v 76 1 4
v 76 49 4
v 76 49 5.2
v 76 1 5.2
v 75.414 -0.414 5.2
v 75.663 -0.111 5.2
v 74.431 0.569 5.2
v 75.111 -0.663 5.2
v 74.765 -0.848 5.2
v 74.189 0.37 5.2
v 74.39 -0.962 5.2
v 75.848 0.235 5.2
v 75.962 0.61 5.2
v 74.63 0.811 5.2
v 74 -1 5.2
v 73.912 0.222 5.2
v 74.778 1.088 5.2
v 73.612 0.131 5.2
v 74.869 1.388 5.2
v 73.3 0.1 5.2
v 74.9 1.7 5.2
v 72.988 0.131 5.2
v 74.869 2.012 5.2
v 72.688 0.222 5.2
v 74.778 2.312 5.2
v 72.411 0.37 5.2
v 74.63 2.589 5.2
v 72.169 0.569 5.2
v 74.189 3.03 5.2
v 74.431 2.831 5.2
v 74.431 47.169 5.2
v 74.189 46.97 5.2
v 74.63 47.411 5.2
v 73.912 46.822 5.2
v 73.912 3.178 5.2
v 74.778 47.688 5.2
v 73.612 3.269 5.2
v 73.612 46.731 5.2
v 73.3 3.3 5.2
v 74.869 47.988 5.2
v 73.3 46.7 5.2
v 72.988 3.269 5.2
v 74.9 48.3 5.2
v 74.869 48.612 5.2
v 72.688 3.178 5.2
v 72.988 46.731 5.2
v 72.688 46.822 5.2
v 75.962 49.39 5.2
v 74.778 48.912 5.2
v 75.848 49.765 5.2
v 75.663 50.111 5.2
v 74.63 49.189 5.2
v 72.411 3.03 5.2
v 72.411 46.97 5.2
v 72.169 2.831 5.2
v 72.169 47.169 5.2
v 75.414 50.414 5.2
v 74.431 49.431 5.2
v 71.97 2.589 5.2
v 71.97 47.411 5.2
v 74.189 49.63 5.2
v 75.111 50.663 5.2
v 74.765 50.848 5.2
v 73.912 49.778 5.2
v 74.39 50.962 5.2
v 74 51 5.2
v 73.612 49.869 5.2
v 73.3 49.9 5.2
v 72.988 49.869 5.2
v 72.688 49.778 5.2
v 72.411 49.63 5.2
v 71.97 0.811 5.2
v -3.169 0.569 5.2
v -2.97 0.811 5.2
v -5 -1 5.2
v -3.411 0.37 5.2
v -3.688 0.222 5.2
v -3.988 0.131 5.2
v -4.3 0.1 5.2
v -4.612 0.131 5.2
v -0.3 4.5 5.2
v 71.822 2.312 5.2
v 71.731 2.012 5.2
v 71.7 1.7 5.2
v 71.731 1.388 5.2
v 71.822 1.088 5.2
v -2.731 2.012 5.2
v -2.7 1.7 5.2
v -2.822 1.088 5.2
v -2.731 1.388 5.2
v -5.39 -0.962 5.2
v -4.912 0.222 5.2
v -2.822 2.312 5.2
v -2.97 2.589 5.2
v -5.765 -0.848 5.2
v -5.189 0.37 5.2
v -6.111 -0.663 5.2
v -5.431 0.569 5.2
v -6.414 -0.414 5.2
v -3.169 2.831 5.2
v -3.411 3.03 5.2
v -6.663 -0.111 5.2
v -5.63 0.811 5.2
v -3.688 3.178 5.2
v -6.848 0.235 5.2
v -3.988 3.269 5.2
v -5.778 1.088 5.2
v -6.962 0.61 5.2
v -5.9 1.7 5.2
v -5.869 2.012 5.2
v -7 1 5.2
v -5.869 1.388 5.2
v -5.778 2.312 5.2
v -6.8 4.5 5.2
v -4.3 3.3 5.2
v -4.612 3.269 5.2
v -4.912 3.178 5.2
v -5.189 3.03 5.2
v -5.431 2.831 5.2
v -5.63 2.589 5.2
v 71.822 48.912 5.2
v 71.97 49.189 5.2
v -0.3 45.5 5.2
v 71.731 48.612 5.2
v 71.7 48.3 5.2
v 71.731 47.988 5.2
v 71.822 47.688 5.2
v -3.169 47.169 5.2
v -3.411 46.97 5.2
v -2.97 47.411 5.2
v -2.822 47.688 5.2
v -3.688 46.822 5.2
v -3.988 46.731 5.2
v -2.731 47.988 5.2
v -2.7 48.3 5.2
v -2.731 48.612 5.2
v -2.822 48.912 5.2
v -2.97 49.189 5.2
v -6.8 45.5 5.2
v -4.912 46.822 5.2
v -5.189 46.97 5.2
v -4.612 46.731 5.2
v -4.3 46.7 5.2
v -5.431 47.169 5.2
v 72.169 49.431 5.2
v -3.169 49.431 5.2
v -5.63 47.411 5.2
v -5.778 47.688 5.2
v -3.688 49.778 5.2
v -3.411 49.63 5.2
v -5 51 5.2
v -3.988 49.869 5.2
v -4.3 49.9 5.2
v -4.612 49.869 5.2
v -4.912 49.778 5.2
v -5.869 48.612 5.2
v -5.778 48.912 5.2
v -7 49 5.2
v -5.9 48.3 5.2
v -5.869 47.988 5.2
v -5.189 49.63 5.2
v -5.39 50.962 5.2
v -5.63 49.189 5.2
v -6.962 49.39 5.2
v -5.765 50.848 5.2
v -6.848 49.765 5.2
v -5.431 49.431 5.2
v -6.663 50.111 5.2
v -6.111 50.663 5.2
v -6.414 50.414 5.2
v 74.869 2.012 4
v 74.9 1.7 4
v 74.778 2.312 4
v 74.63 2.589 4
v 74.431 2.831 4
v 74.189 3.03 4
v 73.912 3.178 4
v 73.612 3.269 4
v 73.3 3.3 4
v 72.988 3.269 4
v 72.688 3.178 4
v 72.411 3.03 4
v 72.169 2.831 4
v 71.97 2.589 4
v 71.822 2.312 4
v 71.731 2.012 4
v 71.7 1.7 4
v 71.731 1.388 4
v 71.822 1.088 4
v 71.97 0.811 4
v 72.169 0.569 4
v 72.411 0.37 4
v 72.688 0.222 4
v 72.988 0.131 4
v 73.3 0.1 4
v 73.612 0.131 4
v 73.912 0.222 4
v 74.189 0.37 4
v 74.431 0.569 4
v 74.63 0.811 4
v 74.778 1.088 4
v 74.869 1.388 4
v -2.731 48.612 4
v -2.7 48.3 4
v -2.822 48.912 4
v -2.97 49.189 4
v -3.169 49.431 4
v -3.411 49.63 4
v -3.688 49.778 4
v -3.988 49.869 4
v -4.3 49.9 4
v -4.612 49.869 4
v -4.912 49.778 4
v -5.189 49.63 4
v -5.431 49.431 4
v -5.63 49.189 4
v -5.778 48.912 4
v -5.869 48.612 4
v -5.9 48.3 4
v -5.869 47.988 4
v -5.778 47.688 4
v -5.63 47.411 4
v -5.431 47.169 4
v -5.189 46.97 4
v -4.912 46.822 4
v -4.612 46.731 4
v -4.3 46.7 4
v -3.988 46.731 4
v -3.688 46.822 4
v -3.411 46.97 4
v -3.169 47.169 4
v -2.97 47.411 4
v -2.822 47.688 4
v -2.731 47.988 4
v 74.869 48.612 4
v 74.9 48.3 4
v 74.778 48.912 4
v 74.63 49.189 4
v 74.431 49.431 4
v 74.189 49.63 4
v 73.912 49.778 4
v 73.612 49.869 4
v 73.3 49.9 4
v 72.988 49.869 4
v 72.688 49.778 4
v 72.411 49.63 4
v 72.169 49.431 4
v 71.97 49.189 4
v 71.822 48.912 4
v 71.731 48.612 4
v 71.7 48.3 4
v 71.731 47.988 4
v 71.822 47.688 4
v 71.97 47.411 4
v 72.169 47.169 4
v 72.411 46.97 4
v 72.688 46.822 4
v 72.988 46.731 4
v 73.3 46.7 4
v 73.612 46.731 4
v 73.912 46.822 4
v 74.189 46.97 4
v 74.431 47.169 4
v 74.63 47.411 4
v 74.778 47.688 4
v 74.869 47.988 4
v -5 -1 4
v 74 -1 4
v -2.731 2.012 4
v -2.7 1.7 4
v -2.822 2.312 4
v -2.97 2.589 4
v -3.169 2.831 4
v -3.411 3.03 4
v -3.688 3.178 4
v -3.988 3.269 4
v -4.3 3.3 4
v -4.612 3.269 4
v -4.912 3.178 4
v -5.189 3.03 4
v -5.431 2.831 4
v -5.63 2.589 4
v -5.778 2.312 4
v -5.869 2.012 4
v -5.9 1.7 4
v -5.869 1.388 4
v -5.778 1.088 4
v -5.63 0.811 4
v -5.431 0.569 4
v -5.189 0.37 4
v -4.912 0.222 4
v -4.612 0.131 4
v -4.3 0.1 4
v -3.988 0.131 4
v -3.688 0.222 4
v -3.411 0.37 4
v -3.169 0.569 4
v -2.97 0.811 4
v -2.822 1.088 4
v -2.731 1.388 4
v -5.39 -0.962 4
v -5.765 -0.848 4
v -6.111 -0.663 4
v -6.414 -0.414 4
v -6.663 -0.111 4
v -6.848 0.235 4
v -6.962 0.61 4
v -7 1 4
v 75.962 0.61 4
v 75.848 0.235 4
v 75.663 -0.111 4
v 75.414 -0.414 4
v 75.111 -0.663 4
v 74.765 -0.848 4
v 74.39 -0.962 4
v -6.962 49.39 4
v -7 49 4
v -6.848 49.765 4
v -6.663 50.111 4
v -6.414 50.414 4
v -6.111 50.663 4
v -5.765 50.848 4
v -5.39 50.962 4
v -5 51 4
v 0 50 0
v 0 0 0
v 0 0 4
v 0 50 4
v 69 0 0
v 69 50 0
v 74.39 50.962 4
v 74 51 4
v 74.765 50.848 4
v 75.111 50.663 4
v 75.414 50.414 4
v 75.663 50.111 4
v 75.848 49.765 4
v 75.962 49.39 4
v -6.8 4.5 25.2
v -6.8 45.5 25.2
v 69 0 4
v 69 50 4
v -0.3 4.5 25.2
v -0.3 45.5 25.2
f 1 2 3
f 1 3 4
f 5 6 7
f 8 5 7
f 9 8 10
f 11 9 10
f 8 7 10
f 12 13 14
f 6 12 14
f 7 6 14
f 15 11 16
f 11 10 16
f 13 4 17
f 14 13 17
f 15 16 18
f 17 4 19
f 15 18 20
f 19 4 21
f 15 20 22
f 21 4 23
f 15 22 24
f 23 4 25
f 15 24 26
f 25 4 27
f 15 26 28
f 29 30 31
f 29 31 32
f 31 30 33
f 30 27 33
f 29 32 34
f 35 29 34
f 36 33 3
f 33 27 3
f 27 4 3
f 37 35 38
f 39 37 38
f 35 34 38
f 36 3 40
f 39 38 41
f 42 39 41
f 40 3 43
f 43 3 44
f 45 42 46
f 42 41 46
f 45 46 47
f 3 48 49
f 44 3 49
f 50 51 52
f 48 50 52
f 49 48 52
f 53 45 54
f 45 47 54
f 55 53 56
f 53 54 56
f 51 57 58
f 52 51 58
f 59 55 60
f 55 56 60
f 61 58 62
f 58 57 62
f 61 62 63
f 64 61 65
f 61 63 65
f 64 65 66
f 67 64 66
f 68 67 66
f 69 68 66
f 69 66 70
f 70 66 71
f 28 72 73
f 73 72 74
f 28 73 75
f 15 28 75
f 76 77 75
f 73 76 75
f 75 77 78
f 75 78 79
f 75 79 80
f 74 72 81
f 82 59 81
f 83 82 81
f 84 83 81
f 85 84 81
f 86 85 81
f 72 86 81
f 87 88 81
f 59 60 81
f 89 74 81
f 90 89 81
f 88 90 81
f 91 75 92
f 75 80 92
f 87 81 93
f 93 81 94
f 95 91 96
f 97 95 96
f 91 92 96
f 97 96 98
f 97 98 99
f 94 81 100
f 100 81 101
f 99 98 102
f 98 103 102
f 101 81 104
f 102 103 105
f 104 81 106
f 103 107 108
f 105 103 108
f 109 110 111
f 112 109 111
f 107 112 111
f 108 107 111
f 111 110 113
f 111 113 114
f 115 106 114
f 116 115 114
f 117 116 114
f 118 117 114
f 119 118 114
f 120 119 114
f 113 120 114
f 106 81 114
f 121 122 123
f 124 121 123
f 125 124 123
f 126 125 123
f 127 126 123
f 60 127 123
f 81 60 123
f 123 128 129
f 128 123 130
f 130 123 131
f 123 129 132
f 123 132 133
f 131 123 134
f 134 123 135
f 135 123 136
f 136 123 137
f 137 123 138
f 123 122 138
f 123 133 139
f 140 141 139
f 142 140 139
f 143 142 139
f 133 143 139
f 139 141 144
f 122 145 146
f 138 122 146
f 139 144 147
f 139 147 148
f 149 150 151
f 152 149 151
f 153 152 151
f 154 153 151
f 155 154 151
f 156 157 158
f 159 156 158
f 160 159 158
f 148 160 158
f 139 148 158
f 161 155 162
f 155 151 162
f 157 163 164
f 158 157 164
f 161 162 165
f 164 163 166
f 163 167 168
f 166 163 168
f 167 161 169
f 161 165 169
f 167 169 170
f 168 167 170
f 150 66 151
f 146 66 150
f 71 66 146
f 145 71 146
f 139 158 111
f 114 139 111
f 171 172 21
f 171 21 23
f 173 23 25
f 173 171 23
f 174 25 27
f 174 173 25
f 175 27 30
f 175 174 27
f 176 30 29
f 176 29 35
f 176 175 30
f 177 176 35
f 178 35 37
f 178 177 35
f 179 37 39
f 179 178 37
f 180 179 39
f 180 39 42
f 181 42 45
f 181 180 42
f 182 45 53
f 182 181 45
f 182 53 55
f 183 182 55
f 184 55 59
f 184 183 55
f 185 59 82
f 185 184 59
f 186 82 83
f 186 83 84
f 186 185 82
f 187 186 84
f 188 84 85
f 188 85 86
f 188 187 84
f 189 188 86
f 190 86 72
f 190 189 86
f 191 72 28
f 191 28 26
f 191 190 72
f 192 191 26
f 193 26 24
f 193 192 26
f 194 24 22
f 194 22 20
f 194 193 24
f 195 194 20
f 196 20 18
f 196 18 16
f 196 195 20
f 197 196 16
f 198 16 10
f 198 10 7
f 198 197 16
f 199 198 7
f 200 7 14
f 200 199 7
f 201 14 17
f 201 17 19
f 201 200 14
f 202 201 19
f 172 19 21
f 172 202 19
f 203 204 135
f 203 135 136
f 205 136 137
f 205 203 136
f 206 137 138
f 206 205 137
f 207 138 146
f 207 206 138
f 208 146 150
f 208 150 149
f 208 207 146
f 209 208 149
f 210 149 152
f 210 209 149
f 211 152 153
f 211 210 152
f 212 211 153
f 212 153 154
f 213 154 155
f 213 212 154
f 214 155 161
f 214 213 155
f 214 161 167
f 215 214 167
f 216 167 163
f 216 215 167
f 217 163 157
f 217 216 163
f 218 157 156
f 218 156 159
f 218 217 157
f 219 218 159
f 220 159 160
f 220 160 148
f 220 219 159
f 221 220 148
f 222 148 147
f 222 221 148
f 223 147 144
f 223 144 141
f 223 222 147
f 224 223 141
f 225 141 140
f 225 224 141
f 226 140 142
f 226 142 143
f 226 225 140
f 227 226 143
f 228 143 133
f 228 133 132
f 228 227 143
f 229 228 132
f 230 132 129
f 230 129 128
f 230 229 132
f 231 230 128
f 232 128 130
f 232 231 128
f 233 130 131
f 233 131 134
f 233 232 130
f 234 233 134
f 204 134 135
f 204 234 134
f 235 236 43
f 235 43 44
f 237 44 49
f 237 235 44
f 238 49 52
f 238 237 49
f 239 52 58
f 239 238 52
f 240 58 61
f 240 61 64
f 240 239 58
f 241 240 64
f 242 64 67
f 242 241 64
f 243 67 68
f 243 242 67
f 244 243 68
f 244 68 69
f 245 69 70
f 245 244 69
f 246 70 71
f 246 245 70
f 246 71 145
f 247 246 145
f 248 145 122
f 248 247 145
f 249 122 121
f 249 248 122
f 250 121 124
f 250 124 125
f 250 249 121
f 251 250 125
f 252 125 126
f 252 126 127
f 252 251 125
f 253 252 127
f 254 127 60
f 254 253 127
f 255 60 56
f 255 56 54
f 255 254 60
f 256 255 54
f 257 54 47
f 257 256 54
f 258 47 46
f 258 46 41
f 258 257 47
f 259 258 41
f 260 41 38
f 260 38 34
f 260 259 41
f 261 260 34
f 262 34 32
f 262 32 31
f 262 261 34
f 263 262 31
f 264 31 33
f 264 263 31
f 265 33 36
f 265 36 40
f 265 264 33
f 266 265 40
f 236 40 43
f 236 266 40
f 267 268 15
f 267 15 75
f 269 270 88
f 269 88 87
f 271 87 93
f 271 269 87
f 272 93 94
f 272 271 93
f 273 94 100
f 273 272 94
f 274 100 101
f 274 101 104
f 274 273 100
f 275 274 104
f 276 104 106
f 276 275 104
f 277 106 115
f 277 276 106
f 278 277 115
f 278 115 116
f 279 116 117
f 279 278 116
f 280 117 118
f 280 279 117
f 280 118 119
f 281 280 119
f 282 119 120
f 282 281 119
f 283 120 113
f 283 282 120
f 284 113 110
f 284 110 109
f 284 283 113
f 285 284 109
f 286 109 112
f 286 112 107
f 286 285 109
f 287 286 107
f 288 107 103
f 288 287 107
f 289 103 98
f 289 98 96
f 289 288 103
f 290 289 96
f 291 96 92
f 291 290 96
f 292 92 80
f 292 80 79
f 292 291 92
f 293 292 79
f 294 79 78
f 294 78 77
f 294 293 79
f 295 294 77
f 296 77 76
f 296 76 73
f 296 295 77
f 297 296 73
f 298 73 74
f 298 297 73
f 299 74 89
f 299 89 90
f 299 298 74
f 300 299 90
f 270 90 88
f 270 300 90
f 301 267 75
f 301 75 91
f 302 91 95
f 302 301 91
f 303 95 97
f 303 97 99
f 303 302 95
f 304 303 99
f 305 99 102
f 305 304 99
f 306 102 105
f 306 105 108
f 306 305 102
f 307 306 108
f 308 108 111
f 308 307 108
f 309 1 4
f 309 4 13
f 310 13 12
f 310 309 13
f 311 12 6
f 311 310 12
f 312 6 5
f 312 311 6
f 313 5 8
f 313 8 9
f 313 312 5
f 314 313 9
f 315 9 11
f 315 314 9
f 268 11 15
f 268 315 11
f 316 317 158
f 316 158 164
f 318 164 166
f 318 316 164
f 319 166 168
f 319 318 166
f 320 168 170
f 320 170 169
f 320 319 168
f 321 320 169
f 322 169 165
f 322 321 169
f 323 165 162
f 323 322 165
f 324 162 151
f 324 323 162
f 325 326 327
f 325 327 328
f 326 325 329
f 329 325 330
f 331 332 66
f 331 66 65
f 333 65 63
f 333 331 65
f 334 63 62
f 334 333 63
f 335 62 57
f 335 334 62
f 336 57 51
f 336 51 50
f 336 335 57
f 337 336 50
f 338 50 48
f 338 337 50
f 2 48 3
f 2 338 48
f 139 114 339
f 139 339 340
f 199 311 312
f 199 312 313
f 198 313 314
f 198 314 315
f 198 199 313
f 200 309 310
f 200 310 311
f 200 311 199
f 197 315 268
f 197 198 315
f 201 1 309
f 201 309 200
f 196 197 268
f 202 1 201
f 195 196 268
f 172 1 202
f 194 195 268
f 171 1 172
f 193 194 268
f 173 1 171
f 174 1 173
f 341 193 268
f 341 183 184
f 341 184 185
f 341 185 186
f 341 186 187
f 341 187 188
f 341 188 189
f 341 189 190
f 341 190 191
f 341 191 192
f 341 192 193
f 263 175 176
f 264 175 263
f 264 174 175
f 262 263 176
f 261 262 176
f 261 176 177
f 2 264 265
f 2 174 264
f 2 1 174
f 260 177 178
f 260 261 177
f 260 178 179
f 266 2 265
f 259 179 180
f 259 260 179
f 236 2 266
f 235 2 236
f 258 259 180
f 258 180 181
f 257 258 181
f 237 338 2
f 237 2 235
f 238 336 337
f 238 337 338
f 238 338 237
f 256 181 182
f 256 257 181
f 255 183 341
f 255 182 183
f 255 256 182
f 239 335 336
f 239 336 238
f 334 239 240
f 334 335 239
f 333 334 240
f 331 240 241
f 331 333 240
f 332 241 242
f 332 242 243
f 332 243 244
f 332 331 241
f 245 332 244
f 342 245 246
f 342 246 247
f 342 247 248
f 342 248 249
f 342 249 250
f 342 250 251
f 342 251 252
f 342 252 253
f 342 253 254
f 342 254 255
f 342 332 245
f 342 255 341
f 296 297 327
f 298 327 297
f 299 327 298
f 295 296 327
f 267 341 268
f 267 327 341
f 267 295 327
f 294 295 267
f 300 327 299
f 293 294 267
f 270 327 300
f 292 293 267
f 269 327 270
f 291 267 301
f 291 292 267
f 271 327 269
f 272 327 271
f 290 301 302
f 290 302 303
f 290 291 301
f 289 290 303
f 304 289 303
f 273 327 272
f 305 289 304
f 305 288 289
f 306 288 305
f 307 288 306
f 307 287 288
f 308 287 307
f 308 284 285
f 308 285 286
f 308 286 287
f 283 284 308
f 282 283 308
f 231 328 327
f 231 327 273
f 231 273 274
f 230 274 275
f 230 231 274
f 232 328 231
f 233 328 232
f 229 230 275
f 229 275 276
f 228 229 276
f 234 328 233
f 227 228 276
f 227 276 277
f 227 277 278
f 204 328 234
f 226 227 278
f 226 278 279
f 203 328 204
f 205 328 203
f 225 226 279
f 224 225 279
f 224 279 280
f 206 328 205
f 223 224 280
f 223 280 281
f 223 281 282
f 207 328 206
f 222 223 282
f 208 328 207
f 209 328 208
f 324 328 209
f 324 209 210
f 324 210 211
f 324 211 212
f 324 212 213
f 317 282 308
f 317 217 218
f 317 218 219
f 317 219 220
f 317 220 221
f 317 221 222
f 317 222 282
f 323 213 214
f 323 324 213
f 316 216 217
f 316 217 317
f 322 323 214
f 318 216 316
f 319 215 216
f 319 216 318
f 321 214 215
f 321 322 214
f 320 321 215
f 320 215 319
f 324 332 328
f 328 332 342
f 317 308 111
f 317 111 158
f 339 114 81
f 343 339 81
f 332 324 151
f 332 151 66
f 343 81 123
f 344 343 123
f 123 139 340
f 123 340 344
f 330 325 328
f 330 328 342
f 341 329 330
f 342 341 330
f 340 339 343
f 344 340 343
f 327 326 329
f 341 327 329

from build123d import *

# Parameters (mm, degrees)
SKETCH_1_W      = 69
SKETCH_1_H      = 50
EXTRUDE_1_DEPTH = 4
SKETCH_2_R      = 1.6
EXTRUDE_2_DEPTH = 1.2
SKETCH_3_W      = 6.5
SKETCH_3_H      = 41
EXTRUDE_3_DEPTH = 20


with BuildPart() as part:
    # 草图1 → 凸台-拉伸1 (new body)
    with BuildSketch(Plane.XY):
        with Locations((34.5, 25)):
            Rectangle(SKETCH_1_W, SKETCH_1_H)
    extrude(amount=EXTRUDE_1_DEPTH)

    # 草图2 → 凸台-拉伸2 (add)
    with BuildSketch(Plane.XY.offset(4)):
        with BuildLine():
            Line((-5, 51), (74, 51))
            ThreePointArc((74, 51), (75.414213562, 50.414213562), (76, 49))
            Line((76, 49), (76, 1))
            ThreePointArc((76, 1), (75.414213562, -0.414213562), (74, -1))
            Line((74, -1), (-5, -1))
            ThreePointArc((-5, -1), (-6.414213562, -0.414213562), (-7, 1))
            Line((-7, 1), (-7, 49))
            ThreePointArc((-7, 49), (-6.414213562, 50.414213562), (-5, 51))
        make_face()
        with Locations((-4.3, 48.3)):
            Circle(SKETCH_2_R, mode=Mode.SUBTRACT)
        with Locations((73.3, 48.3)):
            Circle(SKETCH_2_R, mode=Mode.SUBTRACT)
        with Locations((-4.3, 1.7)):
            Circle(SKETCH_2_R, mode=Mode.SUBTRACT)
        with Locations((73.3, 1.7)):
            Circle(SKETCH_2_R, mode=Mode.SUBTRACT)
    extrude(amount=EXTRUDE_2_DEPTH)

    # 草图3 → 凸台-拉伸3 (add)
    with BuildSketch(Plane.XY.offset(5.2)):
        with Locations((-3.55, 25)):
            Rectangle(SKETCH_3_W, SKETCH_3_H)
    extrude(amount=EXTRUDE_3_DEPTH)


solid = part.part
